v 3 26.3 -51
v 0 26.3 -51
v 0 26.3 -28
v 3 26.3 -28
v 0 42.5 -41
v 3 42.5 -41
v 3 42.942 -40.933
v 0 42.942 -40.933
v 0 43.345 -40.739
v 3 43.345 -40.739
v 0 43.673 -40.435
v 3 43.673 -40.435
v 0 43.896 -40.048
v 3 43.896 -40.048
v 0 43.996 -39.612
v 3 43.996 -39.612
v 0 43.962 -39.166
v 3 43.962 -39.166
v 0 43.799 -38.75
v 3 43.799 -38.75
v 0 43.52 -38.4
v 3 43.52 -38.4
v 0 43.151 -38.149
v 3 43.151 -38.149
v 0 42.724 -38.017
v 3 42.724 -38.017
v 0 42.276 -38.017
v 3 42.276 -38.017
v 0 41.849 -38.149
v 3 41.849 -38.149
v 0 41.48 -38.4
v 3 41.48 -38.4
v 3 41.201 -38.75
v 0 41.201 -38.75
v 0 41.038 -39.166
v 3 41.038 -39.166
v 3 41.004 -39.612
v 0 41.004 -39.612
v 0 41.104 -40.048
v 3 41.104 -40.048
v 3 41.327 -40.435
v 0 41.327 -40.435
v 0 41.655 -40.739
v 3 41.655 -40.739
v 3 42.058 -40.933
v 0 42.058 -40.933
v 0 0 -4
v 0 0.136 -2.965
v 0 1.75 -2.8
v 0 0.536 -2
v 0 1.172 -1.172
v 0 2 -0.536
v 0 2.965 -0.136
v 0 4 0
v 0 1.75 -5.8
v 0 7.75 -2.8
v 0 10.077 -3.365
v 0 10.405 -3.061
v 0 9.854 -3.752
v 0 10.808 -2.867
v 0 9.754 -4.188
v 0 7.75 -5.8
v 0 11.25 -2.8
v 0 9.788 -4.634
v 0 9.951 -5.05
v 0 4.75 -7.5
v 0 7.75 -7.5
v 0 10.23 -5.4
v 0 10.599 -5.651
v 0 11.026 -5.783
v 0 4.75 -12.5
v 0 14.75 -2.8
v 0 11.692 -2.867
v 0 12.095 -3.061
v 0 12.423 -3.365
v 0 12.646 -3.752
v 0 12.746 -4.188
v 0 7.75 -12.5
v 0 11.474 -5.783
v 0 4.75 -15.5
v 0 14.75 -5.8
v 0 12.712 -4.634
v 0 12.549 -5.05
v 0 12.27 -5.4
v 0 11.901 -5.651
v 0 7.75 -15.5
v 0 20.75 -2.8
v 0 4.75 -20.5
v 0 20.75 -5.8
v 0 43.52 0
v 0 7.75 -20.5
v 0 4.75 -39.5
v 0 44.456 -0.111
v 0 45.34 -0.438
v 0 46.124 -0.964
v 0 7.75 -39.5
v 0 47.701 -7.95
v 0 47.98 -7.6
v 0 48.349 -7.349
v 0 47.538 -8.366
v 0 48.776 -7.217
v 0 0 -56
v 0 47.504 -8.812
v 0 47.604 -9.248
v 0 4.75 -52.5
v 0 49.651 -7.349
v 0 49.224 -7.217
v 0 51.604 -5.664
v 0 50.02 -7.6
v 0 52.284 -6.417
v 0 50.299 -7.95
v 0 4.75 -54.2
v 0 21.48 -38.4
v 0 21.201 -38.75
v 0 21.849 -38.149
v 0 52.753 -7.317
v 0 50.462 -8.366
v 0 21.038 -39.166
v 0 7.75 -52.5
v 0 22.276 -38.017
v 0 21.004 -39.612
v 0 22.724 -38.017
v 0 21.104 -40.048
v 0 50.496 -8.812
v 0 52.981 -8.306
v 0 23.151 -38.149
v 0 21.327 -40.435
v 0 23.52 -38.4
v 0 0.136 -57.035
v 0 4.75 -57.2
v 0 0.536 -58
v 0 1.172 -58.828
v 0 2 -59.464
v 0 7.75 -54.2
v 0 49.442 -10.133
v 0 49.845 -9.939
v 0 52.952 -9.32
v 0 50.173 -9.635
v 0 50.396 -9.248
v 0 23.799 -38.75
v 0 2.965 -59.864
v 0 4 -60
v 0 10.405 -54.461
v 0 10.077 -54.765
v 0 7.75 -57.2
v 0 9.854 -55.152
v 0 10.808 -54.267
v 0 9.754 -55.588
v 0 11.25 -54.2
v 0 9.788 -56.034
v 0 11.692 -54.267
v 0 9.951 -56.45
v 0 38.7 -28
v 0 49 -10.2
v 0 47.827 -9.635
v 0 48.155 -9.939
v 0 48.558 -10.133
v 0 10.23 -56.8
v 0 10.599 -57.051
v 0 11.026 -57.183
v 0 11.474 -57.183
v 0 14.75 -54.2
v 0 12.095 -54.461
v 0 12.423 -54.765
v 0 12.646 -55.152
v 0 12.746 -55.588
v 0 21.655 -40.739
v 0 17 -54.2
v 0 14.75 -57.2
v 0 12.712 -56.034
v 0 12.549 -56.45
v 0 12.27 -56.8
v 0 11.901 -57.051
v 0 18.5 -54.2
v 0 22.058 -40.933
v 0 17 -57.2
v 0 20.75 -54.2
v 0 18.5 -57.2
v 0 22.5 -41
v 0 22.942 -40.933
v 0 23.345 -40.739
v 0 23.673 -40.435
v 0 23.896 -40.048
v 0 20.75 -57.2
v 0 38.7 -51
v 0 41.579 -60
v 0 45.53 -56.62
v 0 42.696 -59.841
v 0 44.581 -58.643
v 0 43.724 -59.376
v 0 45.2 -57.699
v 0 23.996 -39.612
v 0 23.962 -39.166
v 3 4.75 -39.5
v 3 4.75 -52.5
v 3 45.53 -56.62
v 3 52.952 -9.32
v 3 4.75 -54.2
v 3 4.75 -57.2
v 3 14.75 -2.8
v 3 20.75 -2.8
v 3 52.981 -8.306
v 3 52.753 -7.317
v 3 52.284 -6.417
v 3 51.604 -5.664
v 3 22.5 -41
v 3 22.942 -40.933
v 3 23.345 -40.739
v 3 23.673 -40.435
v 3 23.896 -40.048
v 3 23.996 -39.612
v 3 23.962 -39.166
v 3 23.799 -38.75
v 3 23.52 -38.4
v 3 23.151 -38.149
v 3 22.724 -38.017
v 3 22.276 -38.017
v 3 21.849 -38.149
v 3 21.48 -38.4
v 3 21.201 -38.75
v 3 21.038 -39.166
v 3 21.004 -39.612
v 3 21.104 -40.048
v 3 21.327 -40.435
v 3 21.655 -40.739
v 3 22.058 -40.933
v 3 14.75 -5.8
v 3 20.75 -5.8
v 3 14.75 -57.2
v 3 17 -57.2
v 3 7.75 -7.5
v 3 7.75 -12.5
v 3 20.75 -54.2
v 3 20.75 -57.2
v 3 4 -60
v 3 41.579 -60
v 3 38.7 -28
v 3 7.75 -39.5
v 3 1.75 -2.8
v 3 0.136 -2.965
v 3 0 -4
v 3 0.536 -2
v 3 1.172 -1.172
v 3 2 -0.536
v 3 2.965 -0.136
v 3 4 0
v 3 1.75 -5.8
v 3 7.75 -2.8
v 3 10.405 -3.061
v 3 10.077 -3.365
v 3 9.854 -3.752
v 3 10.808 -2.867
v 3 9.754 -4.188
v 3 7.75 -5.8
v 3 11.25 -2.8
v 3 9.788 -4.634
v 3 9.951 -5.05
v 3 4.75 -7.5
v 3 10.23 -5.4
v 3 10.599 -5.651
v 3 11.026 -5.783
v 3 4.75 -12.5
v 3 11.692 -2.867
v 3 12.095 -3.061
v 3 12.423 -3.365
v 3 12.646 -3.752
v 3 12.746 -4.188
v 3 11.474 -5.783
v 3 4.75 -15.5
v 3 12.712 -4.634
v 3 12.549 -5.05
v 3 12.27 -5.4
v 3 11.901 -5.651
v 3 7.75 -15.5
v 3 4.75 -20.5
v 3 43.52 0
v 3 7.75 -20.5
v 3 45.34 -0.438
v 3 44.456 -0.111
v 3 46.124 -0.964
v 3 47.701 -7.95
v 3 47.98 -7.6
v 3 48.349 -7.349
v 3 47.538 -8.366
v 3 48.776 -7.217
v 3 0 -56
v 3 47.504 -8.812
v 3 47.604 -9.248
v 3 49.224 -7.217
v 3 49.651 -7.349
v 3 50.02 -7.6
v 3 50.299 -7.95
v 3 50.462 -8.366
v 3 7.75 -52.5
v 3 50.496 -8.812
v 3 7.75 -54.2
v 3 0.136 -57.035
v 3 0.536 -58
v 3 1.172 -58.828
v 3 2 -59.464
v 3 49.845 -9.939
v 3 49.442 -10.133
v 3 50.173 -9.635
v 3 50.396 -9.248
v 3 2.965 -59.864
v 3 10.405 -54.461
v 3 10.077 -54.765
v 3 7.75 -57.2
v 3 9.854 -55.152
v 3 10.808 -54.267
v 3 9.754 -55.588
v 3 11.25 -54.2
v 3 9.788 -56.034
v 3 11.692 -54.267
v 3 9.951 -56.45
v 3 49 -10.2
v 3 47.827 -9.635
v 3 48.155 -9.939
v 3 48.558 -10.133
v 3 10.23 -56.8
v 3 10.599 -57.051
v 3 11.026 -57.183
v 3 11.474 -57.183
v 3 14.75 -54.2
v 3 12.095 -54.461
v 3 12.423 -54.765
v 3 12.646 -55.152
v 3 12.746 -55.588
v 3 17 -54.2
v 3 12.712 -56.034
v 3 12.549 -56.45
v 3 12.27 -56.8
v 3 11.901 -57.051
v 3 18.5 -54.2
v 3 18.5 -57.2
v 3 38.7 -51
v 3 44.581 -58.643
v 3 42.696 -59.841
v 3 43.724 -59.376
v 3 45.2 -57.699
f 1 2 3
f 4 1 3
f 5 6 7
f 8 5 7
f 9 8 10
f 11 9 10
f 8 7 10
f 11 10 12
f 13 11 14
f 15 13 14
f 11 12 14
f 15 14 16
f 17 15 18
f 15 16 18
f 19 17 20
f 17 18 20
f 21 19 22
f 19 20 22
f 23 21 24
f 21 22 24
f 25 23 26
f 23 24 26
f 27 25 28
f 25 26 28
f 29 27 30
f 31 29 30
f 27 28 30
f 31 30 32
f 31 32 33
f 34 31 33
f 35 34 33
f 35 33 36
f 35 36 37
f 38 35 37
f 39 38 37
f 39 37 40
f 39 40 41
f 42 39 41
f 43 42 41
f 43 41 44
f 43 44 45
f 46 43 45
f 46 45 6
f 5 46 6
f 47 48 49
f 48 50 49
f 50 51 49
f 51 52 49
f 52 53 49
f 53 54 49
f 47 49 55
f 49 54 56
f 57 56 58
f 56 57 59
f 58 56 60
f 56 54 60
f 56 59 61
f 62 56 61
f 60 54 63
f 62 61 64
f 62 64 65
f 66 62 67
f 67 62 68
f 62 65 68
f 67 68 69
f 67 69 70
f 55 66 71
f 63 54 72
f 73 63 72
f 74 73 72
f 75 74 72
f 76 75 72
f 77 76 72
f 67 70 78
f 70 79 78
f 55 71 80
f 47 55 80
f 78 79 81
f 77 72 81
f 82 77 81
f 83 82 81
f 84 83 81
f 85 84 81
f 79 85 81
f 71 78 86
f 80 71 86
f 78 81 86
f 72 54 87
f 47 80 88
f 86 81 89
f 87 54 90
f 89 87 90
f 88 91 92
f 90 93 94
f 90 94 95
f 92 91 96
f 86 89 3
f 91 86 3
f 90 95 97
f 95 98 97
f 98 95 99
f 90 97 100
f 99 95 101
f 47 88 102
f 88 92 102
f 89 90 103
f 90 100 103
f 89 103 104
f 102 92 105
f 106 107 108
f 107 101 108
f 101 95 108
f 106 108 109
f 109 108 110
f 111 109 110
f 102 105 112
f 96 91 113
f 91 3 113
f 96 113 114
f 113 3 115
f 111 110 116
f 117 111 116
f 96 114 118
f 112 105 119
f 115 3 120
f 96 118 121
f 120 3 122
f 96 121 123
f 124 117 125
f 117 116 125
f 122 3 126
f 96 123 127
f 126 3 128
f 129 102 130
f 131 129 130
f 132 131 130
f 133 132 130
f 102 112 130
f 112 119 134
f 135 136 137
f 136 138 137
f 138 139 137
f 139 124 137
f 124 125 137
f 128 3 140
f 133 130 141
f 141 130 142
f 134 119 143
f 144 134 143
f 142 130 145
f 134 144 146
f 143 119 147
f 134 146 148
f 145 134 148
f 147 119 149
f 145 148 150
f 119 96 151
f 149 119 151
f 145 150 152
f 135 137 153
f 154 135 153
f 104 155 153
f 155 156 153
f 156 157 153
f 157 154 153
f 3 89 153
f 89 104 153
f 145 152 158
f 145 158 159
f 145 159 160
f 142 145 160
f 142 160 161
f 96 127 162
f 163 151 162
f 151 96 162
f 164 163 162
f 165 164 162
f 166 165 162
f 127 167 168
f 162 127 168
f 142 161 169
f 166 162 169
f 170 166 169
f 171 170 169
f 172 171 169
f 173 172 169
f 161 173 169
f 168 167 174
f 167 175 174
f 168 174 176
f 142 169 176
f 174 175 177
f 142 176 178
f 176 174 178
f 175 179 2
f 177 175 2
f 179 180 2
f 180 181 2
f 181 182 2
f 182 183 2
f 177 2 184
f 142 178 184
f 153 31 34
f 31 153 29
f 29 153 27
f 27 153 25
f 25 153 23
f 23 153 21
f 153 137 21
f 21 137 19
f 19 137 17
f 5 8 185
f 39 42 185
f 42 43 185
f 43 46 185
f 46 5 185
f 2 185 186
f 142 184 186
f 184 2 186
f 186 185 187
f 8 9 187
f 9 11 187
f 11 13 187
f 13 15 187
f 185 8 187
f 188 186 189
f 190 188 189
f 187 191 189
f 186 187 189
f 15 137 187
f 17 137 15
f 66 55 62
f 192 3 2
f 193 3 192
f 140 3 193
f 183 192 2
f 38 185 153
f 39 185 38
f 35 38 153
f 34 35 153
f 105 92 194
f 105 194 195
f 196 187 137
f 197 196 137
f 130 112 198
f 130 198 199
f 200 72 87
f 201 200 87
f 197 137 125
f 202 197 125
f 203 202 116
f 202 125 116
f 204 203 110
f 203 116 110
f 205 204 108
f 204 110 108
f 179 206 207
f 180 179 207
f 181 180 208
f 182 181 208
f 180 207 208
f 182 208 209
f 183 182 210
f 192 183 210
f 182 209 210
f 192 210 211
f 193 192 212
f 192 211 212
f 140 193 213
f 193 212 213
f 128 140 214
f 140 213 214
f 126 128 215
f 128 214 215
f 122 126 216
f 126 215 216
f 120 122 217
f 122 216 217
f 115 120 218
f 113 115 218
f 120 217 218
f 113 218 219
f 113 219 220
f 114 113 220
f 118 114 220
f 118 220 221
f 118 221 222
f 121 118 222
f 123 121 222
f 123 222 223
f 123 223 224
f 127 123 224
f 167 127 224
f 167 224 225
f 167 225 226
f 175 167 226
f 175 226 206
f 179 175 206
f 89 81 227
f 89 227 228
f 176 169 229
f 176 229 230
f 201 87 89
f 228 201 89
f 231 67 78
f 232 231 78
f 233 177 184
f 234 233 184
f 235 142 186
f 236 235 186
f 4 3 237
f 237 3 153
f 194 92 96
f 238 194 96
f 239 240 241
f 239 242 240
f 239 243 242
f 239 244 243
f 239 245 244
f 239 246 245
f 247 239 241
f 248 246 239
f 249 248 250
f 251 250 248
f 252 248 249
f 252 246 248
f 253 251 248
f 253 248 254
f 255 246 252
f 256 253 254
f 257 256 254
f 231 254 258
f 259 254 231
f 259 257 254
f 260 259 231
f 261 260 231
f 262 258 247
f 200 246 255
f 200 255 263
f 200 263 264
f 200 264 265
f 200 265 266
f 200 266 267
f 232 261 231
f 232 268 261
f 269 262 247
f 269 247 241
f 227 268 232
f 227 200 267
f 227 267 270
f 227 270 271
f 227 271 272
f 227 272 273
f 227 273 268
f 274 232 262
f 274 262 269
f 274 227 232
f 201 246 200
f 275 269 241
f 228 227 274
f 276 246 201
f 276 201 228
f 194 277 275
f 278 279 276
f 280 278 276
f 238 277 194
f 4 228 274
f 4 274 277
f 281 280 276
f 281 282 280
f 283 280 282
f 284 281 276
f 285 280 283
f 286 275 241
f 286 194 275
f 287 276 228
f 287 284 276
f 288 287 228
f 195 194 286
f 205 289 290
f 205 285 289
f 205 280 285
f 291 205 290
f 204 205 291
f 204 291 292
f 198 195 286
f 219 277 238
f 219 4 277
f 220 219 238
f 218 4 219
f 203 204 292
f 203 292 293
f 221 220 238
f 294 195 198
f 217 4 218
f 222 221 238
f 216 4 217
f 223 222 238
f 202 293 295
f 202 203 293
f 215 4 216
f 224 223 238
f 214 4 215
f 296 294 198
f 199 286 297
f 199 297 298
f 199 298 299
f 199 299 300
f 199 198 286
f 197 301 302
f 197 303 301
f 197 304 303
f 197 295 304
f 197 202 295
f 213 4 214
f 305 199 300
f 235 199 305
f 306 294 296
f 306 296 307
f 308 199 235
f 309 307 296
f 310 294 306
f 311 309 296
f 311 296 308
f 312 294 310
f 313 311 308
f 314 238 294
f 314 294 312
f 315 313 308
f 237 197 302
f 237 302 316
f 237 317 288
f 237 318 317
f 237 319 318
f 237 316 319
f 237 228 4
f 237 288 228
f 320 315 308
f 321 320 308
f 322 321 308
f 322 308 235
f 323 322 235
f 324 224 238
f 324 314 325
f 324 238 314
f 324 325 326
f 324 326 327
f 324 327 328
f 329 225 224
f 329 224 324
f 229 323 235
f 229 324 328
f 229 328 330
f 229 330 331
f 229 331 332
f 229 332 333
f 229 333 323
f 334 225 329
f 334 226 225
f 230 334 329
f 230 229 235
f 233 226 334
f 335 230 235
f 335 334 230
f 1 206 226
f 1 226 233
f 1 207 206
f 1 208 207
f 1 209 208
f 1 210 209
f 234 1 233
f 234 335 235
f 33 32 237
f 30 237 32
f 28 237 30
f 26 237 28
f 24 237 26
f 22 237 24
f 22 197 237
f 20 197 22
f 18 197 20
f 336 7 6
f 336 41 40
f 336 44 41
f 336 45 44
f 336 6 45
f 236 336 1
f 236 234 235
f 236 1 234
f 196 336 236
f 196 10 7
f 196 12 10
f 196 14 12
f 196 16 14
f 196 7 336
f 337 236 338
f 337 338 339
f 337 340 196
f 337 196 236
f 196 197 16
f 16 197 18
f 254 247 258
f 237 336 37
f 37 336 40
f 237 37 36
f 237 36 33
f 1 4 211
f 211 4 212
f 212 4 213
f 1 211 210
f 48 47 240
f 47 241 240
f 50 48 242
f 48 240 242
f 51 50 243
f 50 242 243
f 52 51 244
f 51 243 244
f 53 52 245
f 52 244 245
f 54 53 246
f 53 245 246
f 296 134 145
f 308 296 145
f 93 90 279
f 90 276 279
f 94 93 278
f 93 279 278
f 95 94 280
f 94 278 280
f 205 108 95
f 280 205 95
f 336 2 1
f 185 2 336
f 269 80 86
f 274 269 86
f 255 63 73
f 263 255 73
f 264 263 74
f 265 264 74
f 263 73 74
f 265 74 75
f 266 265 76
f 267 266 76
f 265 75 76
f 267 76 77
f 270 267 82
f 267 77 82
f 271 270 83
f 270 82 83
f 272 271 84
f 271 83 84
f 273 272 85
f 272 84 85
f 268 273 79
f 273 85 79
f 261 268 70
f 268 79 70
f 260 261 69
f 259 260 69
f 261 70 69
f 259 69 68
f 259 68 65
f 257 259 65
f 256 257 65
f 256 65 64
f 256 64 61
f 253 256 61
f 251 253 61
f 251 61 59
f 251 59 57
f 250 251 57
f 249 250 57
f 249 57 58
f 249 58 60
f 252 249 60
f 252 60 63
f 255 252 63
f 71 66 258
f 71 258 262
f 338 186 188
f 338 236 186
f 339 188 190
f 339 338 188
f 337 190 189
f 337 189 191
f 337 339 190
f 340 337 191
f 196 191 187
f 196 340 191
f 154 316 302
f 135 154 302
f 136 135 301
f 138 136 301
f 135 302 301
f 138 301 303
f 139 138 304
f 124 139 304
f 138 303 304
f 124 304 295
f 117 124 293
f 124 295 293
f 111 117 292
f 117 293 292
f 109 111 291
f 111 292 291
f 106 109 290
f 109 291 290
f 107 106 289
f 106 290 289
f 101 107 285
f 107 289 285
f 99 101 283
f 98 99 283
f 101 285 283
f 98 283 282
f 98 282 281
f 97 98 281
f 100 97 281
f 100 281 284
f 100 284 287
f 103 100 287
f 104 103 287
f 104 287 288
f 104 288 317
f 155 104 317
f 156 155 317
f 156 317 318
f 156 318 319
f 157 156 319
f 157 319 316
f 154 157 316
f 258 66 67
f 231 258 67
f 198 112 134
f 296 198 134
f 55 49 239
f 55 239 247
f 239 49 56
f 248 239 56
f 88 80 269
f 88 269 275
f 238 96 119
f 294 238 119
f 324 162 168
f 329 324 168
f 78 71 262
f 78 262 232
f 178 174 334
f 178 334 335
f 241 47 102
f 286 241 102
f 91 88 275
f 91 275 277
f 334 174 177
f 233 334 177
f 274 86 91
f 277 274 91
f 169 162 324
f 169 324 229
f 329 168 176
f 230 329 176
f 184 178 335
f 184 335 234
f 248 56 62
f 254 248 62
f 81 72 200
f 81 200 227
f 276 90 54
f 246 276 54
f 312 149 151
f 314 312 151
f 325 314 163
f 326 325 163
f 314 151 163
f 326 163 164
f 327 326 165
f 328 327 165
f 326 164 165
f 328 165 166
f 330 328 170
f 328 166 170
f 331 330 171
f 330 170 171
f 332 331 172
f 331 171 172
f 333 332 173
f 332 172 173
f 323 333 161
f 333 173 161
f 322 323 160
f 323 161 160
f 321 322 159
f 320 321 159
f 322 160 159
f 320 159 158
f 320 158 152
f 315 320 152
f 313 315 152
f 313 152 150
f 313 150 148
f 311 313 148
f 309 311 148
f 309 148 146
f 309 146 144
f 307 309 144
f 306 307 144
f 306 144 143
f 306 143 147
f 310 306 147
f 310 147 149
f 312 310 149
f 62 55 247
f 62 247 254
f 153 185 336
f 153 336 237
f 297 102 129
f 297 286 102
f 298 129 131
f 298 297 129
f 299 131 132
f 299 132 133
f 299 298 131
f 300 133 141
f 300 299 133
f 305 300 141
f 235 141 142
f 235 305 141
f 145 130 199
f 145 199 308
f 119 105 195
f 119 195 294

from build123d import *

# Parameters (mm, degrees)
RESSALTO_EXTRUS_O1_DEPTH   = 3
PERFIL_CORTE_W             = 23
PERFIL_CORTE_H             = 12.4
CORTE_PRINCIPAL_DEPTH      = 55.998187902
FURO_DE_DI_METRO_3_0_3_1_D = 3
ESBO_O6_W                  = 3
ESBO_O6_H                  = 6
ESBO_O6_H_2                = 2.25
ESBO_O6_H_3                = 3
CORTE_EXTRUS_O1_DEPTH      = 81.112421009
FURO_DE_DI_METRO_3_0_3_2_D = 3
FURO_DE_DI_METRO_3_0_3_3_D = 3
ESBO_O9_W                  = 5
ESBO_O9_H                  = 3
ESBO_O9_W_2                = 13
CORTE_EXTRUS_O2_DEPTH      = 81.112421009
FILETE1_R                  = 4


with BuildPart() as part:
    # Esboço1 → Ressalto-extrusão1 (new body)
    with BuildSketch(Plane(origin=(0, 0, 0), x_dir=(0, 0, -1), z_dir=(1, 0, 0))):
        with BuildLine():
            Line((0, 0), (60, 0))
            Line((60, 0), (60, 45))
            Line((60, 45), (9.320012162, 52.951655972))
            ThreePointArc((9.320012162, 52.951655972), (7.316640593, 52.753174223), (5.663681972, 51.603991711))
            Line((5.663681972, 51.603991711), (0, 45))
            Line((0, 45), (0, 0))
        make_face()
    extrude(amount=RESSALTO_EXTRUS_O1_DEPTH)

    # Perfil Corte → Corte Principal (cut, through all)
    with BuildSketch(Plane(origin=(0, 41.400449156, -36.080513885), x_dir=(0, 0, 1), z_dir=(-1, 0, 0))):
        with Locations((-3.419486115, -8.900449156)):
            Rectangle(PERFIL_CORTE_W, PERFIL_CORTE_H)
    extrude(amount=-CORTE_PRINCIPAL_DEPTH, mode=Mode.SUBTRACT)

    # Furo de diâmetro Ø3.0 (3)1 (through all)
    with Locations(Plane(origin=(0, -50, -154.479871529), x_dir=(0, 0, 1), z_dir=(-1, 0, 0))):
        with Locations((114.979871529, 92.5), (114.979871529, 72.5)):
            Hole(FURO_DE_DI_METRO_3_0_3_1_D / 2)

    # Esboço6 → Corte-extrusão1 (cut, through all)
    with BuildSketch(Plane(origin=(0, 0, 0), x_dir=(0, 0, -1), z_dir=(1, 0, 0))):
        with Locations((4.3, 17.75)):
            Rectangle(ESBO_O6_W, ESBO_O6_H)
        with Locations((4.3, 4.75)):
            Rectangle(ESBO_O6_W, ESBO_O6_H)
        with Locations((55.7, 19.625)):
            Rectangle(ESBO_O6_W, ESBO_O6_H_2)
        with Locations((55.7, 15.875)):
            Rectangle(ESBO_O6_W, ESBO_O6_H_2)
        with Locations((55.7, 6.25)):
            Rectangle(ESBO_O6_W, ESBO_O6_H_3)
    extrude(amount=CORTE_EXTRUS_O1_DEPTH, mode=Mode.SUBTRACT)

    # Furo de diâmetro Ø3.0 (3)2 (through all)
    with Locations(Plane(origin=(3, 0, 0), x_dir=(0, 0, -1), z_dir=(1, 0, 0))):
        with Locations((4.3, 11.25), (55.7, 11.25)):
            Hole(FURO_DE_DI_METRO_3_0_3_2_D / 2)

    # Furo de diâmetro Ø3.0 (3)3 (through all)
    with Locations(Plane.ZY):
        with Locations((-8.7, 49)):
            Hole(FURO_DE_DI_METRO_3_0_3_3_D / 2)

    # Esboço9 → Corte-extrusão2 (cut, through all)
    with BuildSketch(Plane(origin=(0, 0, 0), x_dir=(0, 0, -1), z_dir=(1, 0, 0))):
        with Locations((10, 6.25)):
            Rectangle(ESBO_O9_W, ESBO_O9_H)
        with Locations((18, 6.25)):
            Rectangle(ESBO_O9_W, ESBO_O9_H)
        with Locations((46, 6.25)):
            Rectangle(ESBO_O9_W_2, ESBO_O9_H)
    extrude(amount=CORTE_EXTRUS_O2_DEPTH, mode=Mode.SUBTRACT)

    # Filete1
    filete1_edges = [part.edges().sort_by_distance(p)[0] for p in [
        (1.5, 45, 0),
        (1.5, 45, -60),
        (1.5, 0, -60),
        (1.5, 0, 0),
    ]]
    fillet(filete1_edges, radius=FILETE1_R)


solid = part.part
